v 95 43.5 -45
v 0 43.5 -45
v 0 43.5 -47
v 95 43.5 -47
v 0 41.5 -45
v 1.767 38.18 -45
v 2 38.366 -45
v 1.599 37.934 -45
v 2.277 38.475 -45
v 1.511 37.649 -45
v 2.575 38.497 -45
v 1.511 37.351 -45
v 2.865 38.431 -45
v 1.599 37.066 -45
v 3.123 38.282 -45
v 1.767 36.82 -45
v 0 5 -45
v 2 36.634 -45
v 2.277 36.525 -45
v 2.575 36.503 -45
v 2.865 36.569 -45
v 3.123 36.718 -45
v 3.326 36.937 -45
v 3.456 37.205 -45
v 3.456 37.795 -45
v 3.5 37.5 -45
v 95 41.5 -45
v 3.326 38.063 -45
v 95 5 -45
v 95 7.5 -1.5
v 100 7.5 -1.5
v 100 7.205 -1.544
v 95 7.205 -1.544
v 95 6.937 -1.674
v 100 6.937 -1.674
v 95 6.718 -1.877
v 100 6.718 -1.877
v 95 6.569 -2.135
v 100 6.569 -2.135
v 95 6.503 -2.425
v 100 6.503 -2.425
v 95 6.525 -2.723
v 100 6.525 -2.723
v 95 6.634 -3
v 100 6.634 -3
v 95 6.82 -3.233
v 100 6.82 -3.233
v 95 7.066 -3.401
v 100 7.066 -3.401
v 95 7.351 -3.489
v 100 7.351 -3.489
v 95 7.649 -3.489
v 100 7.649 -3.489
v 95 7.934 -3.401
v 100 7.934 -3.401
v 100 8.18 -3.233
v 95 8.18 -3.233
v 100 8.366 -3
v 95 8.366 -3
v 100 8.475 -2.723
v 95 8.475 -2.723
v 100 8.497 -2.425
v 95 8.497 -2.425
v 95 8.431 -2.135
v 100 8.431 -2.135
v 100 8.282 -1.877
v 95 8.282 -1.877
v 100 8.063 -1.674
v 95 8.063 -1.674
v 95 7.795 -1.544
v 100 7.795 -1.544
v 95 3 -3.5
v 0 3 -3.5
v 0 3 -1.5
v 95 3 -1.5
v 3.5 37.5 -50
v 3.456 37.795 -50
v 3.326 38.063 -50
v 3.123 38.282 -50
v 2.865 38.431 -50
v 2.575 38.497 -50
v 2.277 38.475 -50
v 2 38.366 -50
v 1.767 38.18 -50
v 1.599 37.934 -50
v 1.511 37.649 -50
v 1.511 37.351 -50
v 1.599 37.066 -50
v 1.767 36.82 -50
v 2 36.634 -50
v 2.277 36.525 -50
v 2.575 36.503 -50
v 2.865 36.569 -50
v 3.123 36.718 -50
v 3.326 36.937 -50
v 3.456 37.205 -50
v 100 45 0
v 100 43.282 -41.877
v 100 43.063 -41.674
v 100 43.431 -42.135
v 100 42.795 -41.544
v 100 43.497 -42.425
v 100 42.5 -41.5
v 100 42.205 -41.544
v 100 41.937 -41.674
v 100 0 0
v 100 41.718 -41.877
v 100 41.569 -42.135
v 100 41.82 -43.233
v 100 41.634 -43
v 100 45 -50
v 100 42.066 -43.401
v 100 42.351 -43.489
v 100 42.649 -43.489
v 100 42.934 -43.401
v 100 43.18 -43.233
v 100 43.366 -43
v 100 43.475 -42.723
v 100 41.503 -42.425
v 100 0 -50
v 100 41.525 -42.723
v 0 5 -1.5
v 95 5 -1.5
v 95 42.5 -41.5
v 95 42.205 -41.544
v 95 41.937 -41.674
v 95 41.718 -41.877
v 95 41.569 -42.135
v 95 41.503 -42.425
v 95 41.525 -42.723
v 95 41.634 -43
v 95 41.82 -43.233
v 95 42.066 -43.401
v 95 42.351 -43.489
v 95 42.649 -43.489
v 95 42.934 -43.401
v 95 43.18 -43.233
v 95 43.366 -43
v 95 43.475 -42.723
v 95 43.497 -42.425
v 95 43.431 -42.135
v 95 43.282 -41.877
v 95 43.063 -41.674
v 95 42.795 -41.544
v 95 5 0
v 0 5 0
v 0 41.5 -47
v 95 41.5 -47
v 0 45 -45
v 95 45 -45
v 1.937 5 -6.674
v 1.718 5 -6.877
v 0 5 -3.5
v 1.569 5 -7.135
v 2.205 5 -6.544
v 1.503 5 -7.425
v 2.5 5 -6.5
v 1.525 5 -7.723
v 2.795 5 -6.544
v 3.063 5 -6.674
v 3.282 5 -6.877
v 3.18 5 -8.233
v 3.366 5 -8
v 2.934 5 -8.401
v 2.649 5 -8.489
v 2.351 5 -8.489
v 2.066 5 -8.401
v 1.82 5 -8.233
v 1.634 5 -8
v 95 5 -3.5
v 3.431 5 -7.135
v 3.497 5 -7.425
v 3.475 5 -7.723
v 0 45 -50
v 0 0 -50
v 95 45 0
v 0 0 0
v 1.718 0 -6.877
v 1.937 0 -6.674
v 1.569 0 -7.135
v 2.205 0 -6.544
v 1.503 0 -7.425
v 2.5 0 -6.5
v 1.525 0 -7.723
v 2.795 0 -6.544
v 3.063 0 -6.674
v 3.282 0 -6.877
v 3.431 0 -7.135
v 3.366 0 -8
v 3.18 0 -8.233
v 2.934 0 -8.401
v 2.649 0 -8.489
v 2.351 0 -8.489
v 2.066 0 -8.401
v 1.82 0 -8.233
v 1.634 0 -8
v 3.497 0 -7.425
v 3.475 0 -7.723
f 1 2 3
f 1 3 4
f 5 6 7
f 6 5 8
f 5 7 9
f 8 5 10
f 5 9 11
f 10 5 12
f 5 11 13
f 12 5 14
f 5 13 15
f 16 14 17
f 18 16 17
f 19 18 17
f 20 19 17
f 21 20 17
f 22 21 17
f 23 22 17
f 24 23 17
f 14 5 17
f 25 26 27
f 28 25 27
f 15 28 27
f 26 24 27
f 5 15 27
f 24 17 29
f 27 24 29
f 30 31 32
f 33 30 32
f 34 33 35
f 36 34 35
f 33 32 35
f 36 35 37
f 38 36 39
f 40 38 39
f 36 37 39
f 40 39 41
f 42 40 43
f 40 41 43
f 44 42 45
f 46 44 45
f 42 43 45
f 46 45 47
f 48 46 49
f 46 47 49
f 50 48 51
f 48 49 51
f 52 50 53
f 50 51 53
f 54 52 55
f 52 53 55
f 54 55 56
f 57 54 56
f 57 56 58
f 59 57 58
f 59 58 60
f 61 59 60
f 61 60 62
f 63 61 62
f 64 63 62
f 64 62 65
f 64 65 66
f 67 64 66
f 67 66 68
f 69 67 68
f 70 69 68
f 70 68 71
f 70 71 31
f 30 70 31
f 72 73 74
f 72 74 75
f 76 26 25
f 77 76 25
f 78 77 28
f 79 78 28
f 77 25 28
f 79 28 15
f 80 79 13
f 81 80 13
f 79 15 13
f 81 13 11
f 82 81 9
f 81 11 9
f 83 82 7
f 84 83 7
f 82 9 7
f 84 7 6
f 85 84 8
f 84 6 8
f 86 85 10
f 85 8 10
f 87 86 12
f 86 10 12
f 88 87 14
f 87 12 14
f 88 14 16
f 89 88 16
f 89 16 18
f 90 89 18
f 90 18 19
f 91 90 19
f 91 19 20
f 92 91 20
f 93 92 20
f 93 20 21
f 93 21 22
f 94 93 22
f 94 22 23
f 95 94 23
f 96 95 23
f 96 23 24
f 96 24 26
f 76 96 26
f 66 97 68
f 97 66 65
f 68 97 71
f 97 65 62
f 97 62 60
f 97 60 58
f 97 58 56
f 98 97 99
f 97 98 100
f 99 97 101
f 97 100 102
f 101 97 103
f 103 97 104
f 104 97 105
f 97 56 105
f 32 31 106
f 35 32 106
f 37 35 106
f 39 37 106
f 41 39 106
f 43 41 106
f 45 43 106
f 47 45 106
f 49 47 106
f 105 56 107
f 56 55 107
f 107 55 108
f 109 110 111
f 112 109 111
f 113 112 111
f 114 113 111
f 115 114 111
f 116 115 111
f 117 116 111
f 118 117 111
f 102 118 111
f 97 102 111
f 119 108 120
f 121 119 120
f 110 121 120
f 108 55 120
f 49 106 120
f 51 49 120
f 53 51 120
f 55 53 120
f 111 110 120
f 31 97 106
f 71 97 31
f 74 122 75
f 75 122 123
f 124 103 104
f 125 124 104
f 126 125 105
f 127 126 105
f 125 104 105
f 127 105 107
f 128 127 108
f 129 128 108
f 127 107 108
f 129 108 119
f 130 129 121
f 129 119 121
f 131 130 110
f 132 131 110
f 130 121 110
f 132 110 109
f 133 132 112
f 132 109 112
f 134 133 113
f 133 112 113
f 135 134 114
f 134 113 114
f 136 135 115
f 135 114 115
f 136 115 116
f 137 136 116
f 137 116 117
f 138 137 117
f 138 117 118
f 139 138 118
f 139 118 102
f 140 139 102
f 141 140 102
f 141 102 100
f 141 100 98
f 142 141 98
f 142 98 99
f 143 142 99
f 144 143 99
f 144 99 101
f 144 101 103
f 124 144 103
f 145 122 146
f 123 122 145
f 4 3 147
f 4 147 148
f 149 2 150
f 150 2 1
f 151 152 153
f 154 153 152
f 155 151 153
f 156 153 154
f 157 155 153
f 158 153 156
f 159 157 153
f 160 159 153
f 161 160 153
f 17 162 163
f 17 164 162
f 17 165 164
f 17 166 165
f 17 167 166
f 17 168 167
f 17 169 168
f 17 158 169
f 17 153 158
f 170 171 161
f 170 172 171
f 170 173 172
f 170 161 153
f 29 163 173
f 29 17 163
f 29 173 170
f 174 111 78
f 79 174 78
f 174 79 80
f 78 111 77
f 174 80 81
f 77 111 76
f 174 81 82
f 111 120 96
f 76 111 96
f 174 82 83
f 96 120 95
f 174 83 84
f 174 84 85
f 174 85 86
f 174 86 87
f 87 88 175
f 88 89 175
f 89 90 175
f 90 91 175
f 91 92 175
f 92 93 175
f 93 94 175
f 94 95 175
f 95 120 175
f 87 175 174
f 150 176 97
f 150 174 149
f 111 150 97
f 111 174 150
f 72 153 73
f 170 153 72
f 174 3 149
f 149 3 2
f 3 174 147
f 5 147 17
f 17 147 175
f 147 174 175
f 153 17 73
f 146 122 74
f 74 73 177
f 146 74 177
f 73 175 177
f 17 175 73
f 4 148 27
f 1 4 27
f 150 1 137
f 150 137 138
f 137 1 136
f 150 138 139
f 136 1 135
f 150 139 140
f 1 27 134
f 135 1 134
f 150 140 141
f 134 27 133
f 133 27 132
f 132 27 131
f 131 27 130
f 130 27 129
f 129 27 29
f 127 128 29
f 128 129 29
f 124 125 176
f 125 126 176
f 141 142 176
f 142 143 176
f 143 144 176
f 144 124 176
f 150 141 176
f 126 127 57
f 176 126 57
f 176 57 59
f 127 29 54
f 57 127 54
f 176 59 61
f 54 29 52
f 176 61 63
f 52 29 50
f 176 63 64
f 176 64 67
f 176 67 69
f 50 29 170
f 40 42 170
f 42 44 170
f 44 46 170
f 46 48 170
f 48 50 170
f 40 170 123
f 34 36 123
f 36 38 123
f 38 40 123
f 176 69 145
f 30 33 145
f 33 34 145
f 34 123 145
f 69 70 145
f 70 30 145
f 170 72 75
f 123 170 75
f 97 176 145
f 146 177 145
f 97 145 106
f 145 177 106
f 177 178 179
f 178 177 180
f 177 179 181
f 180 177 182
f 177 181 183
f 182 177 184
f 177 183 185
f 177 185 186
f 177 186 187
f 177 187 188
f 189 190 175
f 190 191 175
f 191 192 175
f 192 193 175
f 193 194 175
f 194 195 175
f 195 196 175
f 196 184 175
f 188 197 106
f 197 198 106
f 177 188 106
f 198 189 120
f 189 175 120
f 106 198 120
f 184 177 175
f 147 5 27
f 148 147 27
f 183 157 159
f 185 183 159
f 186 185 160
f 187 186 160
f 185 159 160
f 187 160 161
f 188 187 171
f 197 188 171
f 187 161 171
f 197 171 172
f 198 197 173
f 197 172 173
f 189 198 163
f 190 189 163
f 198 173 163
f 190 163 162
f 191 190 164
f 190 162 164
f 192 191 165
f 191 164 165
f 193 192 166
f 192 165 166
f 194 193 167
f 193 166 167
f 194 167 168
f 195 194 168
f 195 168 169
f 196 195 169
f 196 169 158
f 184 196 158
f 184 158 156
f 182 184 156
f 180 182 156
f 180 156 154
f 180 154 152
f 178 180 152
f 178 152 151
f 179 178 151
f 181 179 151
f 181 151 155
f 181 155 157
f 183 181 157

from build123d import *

# Parameters (mm, degrees)
CROQUIS1_W                                  = 100
CROQUIS1_H                                  = 50
SALIENTE_EXTRUIR1_DEPTH                     = 5
SALIENTE_EXTRUIR2_DEPTH                     = 40
CROQUIS3_W                                  = 95
CROQUIS3_H                                  = 2
CORTAR_EXTRUIR1_DEPTH                       = 2
CROQUIS4_W                                  = 95
CROQUIS4_H                                  = 2
CORTAR_EXTRUIR2_DEPTH                       = 2
DI_METRO_DE_TALADRO_2_0_2_1_D               = 2
DI_METRO_DE_TALADRO_2_0_2_2_D               = 2
DI_METRO_DE_TALADRO_2_0_2_2_DEPTH           = 10
DI_METRO_DE_TALADRO_2_0_2_2_TIP             = 0.600860619
DI_METRO_DE_TALADRO_2_0_2_2_ON_FACE_2_D     = 2
DI_METRO_DE_TALADRO_2_0_2_2_ON_FACE_2_DEPTH = 10
DI_METRO_DE_TALADRO_2_0_2_2_ON_FACE_2_TIP   = 0.600860619


with BuildPart() as part:
    # Croquis1 → Saliente-Extruir1 (new body)
    with BuildSketch(Plane(origin=(0, 0, 0), x_dir=(1, 0, 0), z_dir=(0, 1, 0))):
        with Locations((50, 25)):
            Rectangle(CROQUIS1_W, CROQUIS1_H)
    extrude(amount=SALIENTE_EXTRUIR1_DEPTH)

    # Croquis2 → Saliente-Extruir2 (add)
    with BuildSketch(Plane(origin=(0, 5, 0), x_dir=(1, 0, 0), z_dir=(0, 1, 0))):
        Polygon((0, 45), (95, 45), (95, 0), (100, 0), (100, 50), (0, 50), align=None)
    extrude(amount=SALIENTE_EXTRUIR2_DEPTH)

    # Croquis3 → Cortar-Extruir1 (cut)
    with BuildSketch(Plane.XY.offset(-45)):
        with Locations((47.5, 42.5)):
            Rectangle(CROQUIS3_W, CROQUIS3_H)
    extrude(amount=-CORTAR_EXTRUIR1_DEPTH, mode=Mode.SUBTRACT)

    # Croquis4 → Cortar-Extruir2 (cut)
    with BuildSketch(Plane(origin=(0, 5, 0), x_dir=(1, 0, 0), z_dir=(0, 1, 0))):
        with Locations((47.5, 2.5)):
            Rectangle(CROQUIS4_W, CROQUIS4_H)
    extrude(amount=-CORTAR_EXTRUIR2_DEPTH, mode=Mode.SUBTRACT)

    # Diámetro de taladro Ø2.0 (2)1 (through all)
    with Locations(Plane(origin=(95, 42.5, -42.5), x_dir=(0, 0, -1), z_dir=(-1, 0, 0))):
        with Locations((0, 0), (-40, 35)):
            Hole(DI_METRO_DE_TALADRO_2_0_2_1_D / 2)

    # Diámetro de taladro Ø2.0 (2)2
    with Locations(Plane(origin=(2.5, 37.5, -50), x_dir=(-1, 0, 0), z_dir=(0, 0, -1))):
        with Locations((0, 0)):
            Hole(DI_METRO_DE_TALADRO_2_0_2_2_D / 2, depth=DI_METRO_DE_TALADRO_2_0_2_2_DEPTH)
            with Locations((0, 0, -(DI_METRO_DE_TALADRO_2_0_2_2_DEPTH + DI_METRO_DE_TALADRO_2_0_2_2_TIP / 2))):  # 118° drill point
                Cone(0, DI_METRO_DE_TALADRO_2_0_2_2_D / 2, DI_METRO_DE_TALADRO_2_0_2_2_TIP, mode=Mode.SUBTRACT)

    # Diámetro de taladro Ø2.0 (2)2 on face 2
    with Locations(Plane(origin=(2.5, 0, -7.5), x_dir=(0, 0, -1), z_dir=(0, -1, 0))):
        with Locations((0, 0)):
            Hole(DI_METRO_DE_TALADRO_2_0_2_2_ON_FACE_2_D / 2, depth=DI_METRO_DE_TALADRO_2_0_2_2_ON_FACE_2_DEPTH)
            with Locations((0, 0, -(DI_METRO_DE_TALADRO_2_0_2_2_ON_FACE_2_DEPTH + DI_METRO_DE_TALADRO_2_0_2_2_ON_FACE_2_TIP / 2))):  # 118° drill point
                Cone(0, DI_METRO_DE_TALADRO_2_0_2_2_ON_FACE_2_D / 2, DI_METRO_DE_TALADRO_2_0_2_2_ON_FACE_2_TIP, mode=Mode.SUBTRACT)


solid = part.part
